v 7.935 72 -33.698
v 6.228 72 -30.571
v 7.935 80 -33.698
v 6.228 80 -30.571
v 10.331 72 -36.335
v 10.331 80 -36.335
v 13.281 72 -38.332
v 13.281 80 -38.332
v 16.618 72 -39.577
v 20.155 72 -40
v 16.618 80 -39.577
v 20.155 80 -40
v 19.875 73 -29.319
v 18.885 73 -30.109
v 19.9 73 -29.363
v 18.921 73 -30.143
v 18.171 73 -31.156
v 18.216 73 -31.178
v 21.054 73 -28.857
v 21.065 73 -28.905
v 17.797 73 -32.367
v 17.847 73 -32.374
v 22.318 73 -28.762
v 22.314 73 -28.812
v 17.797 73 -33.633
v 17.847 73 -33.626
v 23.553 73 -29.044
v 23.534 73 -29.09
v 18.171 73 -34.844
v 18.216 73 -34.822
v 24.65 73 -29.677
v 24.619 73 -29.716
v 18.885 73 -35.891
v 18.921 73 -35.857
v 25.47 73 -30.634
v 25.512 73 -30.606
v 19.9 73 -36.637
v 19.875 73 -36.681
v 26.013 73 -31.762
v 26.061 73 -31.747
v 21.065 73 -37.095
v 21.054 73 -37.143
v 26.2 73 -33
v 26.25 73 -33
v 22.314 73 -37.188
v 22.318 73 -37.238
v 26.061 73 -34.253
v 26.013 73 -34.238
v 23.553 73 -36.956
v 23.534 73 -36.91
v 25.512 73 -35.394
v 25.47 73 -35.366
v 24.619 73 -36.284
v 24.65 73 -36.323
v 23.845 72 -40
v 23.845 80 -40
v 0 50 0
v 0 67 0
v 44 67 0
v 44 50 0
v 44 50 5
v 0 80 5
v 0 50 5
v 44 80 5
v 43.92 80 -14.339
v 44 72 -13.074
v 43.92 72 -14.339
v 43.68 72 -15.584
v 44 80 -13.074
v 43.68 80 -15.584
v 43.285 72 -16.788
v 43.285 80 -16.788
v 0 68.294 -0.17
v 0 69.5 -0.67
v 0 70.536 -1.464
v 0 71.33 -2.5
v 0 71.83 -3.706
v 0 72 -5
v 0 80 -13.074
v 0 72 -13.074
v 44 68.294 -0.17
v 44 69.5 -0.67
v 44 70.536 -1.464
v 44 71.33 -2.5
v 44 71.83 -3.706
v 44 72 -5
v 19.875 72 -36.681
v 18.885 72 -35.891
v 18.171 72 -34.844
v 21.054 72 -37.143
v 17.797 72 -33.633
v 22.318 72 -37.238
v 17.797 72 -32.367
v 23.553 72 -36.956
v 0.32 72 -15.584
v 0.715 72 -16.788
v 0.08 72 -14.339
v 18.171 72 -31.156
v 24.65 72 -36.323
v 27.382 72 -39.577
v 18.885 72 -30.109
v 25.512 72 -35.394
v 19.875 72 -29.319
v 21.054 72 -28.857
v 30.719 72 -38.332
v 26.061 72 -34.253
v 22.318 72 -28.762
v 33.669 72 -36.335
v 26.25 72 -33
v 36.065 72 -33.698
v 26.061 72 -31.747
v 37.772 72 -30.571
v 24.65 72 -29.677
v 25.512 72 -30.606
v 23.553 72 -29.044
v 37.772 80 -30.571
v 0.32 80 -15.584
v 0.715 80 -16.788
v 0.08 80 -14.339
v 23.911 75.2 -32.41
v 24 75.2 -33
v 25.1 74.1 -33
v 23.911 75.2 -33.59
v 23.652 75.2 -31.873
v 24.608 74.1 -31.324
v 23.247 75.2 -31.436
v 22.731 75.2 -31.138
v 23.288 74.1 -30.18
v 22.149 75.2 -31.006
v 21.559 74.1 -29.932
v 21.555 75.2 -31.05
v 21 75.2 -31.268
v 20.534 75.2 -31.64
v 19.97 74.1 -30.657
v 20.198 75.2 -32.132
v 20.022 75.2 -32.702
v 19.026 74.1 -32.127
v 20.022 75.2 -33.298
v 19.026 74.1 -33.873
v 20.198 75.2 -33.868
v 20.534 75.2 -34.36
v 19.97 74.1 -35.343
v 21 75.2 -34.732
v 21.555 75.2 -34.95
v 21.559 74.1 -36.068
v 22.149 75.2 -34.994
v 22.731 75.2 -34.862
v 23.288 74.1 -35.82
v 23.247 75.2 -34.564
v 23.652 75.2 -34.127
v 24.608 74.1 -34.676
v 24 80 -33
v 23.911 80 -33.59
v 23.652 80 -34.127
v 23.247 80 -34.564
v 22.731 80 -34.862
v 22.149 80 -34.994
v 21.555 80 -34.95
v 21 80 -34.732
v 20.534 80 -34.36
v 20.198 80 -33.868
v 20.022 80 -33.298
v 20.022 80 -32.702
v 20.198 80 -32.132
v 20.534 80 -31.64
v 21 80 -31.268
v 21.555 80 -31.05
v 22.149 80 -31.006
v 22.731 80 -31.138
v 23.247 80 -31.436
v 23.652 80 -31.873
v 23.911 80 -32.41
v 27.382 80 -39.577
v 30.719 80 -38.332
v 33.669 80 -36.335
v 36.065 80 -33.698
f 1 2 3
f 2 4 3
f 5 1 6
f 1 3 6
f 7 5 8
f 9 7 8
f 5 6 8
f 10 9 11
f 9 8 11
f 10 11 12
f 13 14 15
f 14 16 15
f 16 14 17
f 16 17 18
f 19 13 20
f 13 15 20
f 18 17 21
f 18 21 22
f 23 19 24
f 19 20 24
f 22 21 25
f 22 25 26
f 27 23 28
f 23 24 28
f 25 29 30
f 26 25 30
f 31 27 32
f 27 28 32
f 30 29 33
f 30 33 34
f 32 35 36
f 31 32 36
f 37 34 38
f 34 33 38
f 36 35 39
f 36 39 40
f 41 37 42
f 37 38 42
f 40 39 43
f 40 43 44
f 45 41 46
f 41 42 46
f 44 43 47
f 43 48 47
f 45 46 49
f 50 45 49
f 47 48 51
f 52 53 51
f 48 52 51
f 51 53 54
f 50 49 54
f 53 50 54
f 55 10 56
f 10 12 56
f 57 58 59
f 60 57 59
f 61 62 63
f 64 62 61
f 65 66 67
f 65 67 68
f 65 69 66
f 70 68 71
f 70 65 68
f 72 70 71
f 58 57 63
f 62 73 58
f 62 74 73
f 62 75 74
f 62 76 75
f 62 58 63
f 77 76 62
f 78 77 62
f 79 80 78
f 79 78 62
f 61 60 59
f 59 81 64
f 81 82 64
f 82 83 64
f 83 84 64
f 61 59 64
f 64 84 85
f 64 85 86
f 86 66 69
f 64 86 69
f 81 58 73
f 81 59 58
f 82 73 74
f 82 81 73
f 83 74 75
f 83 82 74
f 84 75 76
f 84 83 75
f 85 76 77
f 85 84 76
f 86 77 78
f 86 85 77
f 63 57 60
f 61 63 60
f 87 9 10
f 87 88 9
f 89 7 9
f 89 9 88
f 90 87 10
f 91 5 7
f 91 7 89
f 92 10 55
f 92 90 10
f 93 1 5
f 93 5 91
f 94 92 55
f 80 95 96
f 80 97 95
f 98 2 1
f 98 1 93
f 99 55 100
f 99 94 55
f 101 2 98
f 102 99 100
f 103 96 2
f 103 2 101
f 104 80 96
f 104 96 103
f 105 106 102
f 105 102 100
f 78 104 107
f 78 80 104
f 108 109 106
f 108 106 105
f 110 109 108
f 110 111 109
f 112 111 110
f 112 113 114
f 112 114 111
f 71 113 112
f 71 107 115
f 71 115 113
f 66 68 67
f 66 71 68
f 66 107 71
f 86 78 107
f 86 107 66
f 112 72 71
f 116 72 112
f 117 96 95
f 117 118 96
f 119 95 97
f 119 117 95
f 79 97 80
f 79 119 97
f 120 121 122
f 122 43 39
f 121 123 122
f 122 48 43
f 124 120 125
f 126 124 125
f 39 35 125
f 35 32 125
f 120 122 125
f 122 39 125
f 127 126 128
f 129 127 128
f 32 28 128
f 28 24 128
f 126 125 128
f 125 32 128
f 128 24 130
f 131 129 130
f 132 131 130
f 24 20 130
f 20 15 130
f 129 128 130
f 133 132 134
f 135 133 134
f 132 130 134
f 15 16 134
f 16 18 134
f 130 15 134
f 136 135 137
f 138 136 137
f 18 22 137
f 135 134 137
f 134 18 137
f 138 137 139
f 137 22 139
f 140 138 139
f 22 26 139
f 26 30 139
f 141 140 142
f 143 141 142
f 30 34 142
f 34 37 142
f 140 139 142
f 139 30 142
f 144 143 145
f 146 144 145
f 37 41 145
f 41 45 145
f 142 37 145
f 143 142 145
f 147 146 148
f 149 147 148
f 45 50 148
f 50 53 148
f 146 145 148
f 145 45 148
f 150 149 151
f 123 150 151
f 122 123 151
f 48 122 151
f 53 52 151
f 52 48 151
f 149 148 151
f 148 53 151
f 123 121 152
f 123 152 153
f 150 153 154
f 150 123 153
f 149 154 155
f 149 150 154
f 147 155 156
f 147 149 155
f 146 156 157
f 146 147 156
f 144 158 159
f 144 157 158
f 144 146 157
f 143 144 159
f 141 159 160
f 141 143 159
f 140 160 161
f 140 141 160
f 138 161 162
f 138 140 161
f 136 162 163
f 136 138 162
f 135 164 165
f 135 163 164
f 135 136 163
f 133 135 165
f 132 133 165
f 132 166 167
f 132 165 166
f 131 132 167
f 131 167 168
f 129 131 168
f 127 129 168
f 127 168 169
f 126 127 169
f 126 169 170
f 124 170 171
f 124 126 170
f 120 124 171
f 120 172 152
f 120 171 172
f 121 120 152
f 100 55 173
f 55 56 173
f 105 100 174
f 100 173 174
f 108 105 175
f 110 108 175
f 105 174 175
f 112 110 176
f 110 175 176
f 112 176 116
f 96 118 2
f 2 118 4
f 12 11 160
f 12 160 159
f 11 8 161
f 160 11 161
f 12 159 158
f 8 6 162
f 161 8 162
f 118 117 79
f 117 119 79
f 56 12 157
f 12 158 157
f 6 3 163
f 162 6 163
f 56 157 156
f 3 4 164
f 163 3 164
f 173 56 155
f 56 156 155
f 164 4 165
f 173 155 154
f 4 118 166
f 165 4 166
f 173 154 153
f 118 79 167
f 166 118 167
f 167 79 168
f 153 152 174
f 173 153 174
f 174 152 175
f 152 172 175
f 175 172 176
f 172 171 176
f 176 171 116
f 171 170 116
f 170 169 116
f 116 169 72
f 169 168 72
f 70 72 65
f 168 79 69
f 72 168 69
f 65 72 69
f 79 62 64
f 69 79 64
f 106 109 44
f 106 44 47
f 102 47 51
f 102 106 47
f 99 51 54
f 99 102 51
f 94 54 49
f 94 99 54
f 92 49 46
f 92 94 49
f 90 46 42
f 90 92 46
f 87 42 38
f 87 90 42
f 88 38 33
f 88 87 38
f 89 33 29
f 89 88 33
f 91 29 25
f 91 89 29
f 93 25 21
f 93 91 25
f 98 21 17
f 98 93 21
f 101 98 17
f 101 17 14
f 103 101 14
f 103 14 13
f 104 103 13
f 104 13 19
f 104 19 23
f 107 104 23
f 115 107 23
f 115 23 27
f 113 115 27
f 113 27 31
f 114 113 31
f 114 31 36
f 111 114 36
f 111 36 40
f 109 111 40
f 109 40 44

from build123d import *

# Parameters (mm, degrees)
CYLINDER004_R             = 2
CYLINDER004_DEPTH         = 10
CYLINDER005_R             = 4.25
CYLINDER005_DEPTH         = 10
FUSION006_PLACEMENT_ANGLE = 180
CYLINDER006_R             = 4.25
CYLINDER006_DEPTH         = 10
CYLINDER003_R             = 2
CYLINDER003_DEPTH         = 10
CYLINDER002_R             = 4.25
CYLINDER002_DEPTH         = 10
EXTRUDE_DEPTH             = 8
BOX004_W                  = 24
BOX004_H                  = 8
BOX004_DEPTH              = 45
BOX003_W                  = 44
BOX003_H                  = 8
BOX003_DEPTH              = 15
BOX002_W                  = 44
BOX002_H                  = 30
BOX002_DEPTH              = 5
FILLET_R                  = 5
FILLET001_R               = 15
FILLET002_R               = 10
CHAMFER001_SIZE           = 2.2
CHAMFER002_SIZE           = 2.2


with BuildPart() as cylinder004:
    # Cylinder004 → Cylinder004 (new body)
    with BuildSketch(Plane(origin=(22, 80, -33), x_dir=(1, 0, 0), z_dir=(0, -1, 0))):
        Circle(CYLINDER004_R)
    extrude(amount=CYLINDER004_DEPTH)


with BuildPart() as fusion006:
    # Cylinder005 → Cylinder005 (new body)
    with BuildSketch(Plane(origin=(22, 89, -33), x_dir=(1, 0, 0), z_dir=(0, -1, 0))):
        Circle(CYLINDER005_R)
    extrude(amount=CYLINDER005_DEPTH)

    # Fusion006: union Cylinder004
    add(cylinder004.part)


with BuildPart() as fusion006_1:
    # Fusion006 placement: moved
    add(fusion006.part.moved(Location((0, 152, -66))).rotate(Axis((0, 152, -66), (1, 0, 0)), FUSION006_PLACEMENT_ANGLE))


with BuildPart() as cylinder006:
    # Cylinder006 → Cylinder006 (new body)
    with BuildSketch(Plane(origin=(22, 80, -33), x_dir=(1, 0, 0), z_dir=(0, -1, 0))):
        Circle(CYLINDER006_R)
    extrude(amount=CYLINDER006_DEPTH)


with BuildPart() as cylinder003:
    # Cylinder003 → Cylinder003 (new body)
    with BuildSketch(Plane(origin=(22, 80, -33), x_dir=(1, 0, 0), z_dir=(0, -1, 0))):
        Circle(CYLINDER003_R)
    extrude(amount=CYLINDER003_DEPTH)


with BuildPart() as fusion005:
    # Cylinder002 → Cylinder002 (new body)
    with BuildSketch(Plane(origin=(22, 89, -33), x_dir=(1, 0, 0), z_dir=(0, -1, 0))):
        Circle(CYLINDER002_R)
    extrude(amount=CYLINDER002_DEPTH)

    # Fusion005: union Cylinder003
    add(cylinder003.part)


with BuildPart() as extrude_body:
    # Sketch (on Face11 of Fusion003) → Extrude (new body)
    with BuildSketch(Plane(origin=(0, 80, 0), x_dir=(-1, 0, 0), z_dir=(0, 1, 0))):
        Polygon((-44, -15), (-34, -40), (-34, -15), align=None)
        Polygon((-10, -15), (0, -15), (-10, -40), align=None)
    extrude(amount=-EXTRUDE_DEPTH)


with BuildPart() as cube004:
    # Box004 → Box004 (new body)
    with BuildSketch(Plane(origin=(10, 72, -40), x_dir=(1, 0, 0), z_dir=(0, 0, 1))):
        with Locations((12, 4)):
            Rectangle(BOX004_W, BOX004_H)
    extrude(amount=BOX004_DEPTH)


with BuildPart() as cube003:
    # Box003 → Box003 (new body)
    with BuildSketch(Plane(origin=(0, 72, -15), x_dir=(1, 0, 0), z_dir=(0, 0, 1))):
        with Locations((22, 4)):
            Rectangle(BOX003_W, BOX003_H)
    extrude(amount=BOX003_DEPTH)


with BuildPart() as pieza_interior_x4:
    # Box002 → Box002 (new body)
    with BuildSketch(Plane(origin=(0, 50, 0), x_dir=(1, 0, 0), z_dir=(0, 0, 1))):
        with Locations((22, 15)):
            Rectangle(BOX002_W, BOX002_H)
    extrude(amount=BOX002_DEPTH)

    # Fusion002: union Cube003
    add(cube003.part)

    # Fillet
    fillet_edges = [pieza_interior_x4.edges().sort_by_distance(p)[0] for p in [
        (22, 72, 0),
    ]]
    fillet(fillet_edges, radius=FILLET_R)

    # Fusion003: union Cube004
    add(cube004.part)

    # Fusion004: union Extrude body
    add(extrude_body.part)

    # Fillet001
    fillet001_edges = [pieza_interior_x4.edges().sort_by_distance(p)[0] for p in [
        (10, 76, -40),
        (34, 76, -40),
    ]]
    fillet(fillet001_edges, radius=FILLET001_R)

    # Fillet002
    fillet002_edges = [pieza_interior_x4.edges().sort_by_distance(p)[0] for p in [
        (44, 76, -15),
        (0, 76, -15),
    ]]
    fillet(fillet002_edges, radius=FILLET002_R)

    # Cut001: cut Fusion005
    add(fusion005.part, mode=Mode.SUBTRACT)

    # Chamfer001
    chamfer001_edges = [pieza_interior_x4.edges().sort_by_distance(p)[0] for p in [
        (20, 79, -33),
    ]]
    chamfer(chamfer001_edges, length=CHAMFER001_SIZE)

    # Fusion007: union Cylinder006
    add(cylinder006.part)

    # Cut002: cut Fusion006
    add(fusion006_1.part, mode=Mode.SUBTRACT)

    # Chamfer002
    chamfer002_edges = [pieza_interior_x4.edges().sort_by_distance(p)[0] for p in [
        (20, 73, -33),
    ]]
    chamfer(chamfer002_edges, length=CHAMFER002_SIZE)


solid = pieza_interior_x4.part
